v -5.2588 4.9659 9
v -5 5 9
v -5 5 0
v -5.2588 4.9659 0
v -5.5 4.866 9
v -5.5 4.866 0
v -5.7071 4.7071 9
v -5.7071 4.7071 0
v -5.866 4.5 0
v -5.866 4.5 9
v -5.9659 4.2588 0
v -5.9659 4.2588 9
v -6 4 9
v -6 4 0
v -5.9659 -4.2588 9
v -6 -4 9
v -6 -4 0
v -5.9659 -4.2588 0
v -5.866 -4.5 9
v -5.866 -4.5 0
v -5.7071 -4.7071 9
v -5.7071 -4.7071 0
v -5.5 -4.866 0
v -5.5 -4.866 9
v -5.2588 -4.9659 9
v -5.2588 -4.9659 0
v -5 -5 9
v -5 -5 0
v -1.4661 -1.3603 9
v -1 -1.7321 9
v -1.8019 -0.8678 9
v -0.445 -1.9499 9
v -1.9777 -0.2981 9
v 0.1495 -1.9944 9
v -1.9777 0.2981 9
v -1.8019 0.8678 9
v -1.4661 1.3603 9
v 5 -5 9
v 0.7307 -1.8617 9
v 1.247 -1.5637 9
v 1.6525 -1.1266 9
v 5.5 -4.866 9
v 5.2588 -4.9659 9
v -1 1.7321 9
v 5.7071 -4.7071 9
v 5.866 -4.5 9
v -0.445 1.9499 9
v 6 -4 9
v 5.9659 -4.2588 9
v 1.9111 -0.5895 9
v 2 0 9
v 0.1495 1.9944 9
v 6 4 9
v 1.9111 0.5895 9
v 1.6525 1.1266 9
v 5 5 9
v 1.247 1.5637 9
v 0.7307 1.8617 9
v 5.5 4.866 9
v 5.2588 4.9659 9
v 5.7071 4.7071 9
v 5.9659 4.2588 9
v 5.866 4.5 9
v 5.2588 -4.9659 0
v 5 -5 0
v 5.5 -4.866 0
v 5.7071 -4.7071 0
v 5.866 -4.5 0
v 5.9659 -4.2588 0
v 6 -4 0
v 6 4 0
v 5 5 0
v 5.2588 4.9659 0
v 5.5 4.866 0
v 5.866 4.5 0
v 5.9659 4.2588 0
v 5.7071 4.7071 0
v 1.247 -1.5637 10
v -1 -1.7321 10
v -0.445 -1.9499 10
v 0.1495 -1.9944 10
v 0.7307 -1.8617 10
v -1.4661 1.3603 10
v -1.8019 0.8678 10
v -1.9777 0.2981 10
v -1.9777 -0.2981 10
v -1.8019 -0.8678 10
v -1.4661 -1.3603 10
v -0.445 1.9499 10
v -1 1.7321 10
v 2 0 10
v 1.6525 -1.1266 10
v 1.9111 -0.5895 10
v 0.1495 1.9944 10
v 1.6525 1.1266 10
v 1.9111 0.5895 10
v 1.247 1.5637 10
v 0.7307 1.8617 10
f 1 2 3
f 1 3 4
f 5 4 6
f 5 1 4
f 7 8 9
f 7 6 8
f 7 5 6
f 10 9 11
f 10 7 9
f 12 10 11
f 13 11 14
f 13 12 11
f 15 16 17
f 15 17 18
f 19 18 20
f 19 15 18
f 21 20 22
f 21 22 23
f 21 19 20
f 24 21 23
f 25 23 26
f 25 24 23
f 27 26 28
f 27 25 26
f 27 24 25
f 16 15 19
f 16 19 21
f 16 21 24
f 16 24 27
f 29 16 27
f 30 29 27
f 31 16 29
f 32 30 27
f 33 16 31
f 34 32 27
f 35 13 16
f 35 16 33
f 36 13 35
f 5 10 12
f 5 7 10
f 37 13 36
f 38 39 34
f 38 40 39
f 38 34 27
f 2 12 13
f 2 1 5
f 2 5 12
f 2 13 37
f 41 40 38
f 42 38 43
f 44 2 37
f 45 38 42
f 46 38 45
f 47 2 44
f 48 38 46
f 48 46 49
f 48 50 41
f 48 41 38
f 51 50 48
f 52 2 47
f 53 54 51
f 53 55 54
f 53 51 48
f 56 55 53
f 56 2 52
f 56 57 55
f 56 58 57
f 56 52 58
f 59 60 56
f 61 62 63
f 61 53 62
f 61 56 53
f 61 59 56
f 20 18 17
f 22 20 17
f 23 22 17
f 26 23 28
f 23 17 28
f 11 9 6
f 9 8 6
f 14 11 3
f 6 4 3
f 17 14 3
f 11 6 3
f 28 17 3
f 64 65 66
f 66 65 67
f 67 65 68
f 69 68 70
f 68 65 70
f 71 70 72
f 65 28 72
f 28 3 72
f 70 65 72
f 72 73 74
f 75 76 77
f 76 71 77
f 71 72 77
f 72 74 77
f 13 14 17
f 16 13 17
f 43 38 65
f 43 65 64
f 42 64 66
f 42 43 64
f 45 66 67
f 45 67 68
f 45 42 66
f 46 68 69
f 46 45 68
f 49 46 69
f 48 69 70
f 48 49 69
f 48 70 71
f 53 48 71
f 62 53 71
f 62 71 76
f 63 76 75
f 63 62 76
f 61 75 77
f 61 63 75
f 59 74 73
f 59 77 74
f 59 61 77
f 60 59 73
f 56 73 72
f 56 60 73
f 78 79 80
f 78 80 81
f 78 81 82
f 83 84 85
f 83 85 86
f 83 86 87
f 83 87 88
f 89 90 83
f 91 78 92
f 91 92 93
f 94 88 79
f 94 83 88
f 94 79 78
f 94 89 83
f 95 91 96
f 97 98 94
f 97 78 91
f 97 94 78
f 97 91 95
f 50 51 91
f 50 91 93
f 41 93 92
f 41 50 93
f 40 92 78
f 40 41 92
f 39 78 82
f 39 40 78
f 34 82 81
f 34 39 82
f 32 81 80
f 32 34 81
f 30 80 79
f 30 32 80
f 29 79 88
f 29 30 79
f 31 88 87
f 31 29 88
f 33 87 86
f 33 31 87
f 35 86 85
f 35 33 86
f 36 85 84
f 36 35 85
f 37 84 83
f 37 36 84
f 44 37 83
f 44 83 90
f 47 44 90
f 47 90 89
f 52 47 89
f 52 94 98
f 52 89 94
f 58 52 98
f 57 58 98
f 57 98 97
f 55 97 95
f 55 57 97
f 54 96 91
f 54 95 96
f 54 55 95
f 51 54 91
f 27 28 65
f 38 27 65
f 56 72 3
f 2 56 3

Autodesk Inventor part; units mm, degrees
ref_plane "YZ Plane" through (0, 0, 0) normal (1, 0, 0) x (0, 1, 0)
ref_plane "XZ Plane" through (0, 0, 0) normal (0, 1, 0) x (-1, 0, 0)
ref_plane "XY Plane" through (0, 0, 0) normal (0, 0, 1) x (1, 0, 0)
sketch "Esquisse1" plane through (0, 0, 0) normal (0, 0, 1) x (1, 0, 0)
  line L0 (-6, -5) -> (6, -5)
  line L1 (6, -5) -> (6, 5)
  line L2 (6, 5) -> (-6, 5)
  line L3 (-6, 5) -> (-6, -5)
  point P0 (0, 0)
  dimension "d0" = 10
  dimension "d1" = 12
  dimension "d2" = 6
  dimension "d3" = 5
extrude "Extrusion1" add sketch "Esquisse1" along normal blind 9
sketch "Esquisse2" plane through (0, 0, 9) normal (0, 0, 1) x (1, 0, 0)
  circle A0 centre (0, 0) radius 2
  dimension "d6" = 4
extrude "Extrusion2" add sketch "Esquisse2" along normal blind 1
fillet "Congé1" radius 1 4 edges at (-6, 5, 4.5) (6, 5, 4.5) (6, -5, 4.5) (-6, -5, 4.5)
equation "\"d2\" = 0.5 * d1"
equation "\"d3\" = 0.5 * d0"
properties part number "reducteur" material "Laiton, jaune doux"
